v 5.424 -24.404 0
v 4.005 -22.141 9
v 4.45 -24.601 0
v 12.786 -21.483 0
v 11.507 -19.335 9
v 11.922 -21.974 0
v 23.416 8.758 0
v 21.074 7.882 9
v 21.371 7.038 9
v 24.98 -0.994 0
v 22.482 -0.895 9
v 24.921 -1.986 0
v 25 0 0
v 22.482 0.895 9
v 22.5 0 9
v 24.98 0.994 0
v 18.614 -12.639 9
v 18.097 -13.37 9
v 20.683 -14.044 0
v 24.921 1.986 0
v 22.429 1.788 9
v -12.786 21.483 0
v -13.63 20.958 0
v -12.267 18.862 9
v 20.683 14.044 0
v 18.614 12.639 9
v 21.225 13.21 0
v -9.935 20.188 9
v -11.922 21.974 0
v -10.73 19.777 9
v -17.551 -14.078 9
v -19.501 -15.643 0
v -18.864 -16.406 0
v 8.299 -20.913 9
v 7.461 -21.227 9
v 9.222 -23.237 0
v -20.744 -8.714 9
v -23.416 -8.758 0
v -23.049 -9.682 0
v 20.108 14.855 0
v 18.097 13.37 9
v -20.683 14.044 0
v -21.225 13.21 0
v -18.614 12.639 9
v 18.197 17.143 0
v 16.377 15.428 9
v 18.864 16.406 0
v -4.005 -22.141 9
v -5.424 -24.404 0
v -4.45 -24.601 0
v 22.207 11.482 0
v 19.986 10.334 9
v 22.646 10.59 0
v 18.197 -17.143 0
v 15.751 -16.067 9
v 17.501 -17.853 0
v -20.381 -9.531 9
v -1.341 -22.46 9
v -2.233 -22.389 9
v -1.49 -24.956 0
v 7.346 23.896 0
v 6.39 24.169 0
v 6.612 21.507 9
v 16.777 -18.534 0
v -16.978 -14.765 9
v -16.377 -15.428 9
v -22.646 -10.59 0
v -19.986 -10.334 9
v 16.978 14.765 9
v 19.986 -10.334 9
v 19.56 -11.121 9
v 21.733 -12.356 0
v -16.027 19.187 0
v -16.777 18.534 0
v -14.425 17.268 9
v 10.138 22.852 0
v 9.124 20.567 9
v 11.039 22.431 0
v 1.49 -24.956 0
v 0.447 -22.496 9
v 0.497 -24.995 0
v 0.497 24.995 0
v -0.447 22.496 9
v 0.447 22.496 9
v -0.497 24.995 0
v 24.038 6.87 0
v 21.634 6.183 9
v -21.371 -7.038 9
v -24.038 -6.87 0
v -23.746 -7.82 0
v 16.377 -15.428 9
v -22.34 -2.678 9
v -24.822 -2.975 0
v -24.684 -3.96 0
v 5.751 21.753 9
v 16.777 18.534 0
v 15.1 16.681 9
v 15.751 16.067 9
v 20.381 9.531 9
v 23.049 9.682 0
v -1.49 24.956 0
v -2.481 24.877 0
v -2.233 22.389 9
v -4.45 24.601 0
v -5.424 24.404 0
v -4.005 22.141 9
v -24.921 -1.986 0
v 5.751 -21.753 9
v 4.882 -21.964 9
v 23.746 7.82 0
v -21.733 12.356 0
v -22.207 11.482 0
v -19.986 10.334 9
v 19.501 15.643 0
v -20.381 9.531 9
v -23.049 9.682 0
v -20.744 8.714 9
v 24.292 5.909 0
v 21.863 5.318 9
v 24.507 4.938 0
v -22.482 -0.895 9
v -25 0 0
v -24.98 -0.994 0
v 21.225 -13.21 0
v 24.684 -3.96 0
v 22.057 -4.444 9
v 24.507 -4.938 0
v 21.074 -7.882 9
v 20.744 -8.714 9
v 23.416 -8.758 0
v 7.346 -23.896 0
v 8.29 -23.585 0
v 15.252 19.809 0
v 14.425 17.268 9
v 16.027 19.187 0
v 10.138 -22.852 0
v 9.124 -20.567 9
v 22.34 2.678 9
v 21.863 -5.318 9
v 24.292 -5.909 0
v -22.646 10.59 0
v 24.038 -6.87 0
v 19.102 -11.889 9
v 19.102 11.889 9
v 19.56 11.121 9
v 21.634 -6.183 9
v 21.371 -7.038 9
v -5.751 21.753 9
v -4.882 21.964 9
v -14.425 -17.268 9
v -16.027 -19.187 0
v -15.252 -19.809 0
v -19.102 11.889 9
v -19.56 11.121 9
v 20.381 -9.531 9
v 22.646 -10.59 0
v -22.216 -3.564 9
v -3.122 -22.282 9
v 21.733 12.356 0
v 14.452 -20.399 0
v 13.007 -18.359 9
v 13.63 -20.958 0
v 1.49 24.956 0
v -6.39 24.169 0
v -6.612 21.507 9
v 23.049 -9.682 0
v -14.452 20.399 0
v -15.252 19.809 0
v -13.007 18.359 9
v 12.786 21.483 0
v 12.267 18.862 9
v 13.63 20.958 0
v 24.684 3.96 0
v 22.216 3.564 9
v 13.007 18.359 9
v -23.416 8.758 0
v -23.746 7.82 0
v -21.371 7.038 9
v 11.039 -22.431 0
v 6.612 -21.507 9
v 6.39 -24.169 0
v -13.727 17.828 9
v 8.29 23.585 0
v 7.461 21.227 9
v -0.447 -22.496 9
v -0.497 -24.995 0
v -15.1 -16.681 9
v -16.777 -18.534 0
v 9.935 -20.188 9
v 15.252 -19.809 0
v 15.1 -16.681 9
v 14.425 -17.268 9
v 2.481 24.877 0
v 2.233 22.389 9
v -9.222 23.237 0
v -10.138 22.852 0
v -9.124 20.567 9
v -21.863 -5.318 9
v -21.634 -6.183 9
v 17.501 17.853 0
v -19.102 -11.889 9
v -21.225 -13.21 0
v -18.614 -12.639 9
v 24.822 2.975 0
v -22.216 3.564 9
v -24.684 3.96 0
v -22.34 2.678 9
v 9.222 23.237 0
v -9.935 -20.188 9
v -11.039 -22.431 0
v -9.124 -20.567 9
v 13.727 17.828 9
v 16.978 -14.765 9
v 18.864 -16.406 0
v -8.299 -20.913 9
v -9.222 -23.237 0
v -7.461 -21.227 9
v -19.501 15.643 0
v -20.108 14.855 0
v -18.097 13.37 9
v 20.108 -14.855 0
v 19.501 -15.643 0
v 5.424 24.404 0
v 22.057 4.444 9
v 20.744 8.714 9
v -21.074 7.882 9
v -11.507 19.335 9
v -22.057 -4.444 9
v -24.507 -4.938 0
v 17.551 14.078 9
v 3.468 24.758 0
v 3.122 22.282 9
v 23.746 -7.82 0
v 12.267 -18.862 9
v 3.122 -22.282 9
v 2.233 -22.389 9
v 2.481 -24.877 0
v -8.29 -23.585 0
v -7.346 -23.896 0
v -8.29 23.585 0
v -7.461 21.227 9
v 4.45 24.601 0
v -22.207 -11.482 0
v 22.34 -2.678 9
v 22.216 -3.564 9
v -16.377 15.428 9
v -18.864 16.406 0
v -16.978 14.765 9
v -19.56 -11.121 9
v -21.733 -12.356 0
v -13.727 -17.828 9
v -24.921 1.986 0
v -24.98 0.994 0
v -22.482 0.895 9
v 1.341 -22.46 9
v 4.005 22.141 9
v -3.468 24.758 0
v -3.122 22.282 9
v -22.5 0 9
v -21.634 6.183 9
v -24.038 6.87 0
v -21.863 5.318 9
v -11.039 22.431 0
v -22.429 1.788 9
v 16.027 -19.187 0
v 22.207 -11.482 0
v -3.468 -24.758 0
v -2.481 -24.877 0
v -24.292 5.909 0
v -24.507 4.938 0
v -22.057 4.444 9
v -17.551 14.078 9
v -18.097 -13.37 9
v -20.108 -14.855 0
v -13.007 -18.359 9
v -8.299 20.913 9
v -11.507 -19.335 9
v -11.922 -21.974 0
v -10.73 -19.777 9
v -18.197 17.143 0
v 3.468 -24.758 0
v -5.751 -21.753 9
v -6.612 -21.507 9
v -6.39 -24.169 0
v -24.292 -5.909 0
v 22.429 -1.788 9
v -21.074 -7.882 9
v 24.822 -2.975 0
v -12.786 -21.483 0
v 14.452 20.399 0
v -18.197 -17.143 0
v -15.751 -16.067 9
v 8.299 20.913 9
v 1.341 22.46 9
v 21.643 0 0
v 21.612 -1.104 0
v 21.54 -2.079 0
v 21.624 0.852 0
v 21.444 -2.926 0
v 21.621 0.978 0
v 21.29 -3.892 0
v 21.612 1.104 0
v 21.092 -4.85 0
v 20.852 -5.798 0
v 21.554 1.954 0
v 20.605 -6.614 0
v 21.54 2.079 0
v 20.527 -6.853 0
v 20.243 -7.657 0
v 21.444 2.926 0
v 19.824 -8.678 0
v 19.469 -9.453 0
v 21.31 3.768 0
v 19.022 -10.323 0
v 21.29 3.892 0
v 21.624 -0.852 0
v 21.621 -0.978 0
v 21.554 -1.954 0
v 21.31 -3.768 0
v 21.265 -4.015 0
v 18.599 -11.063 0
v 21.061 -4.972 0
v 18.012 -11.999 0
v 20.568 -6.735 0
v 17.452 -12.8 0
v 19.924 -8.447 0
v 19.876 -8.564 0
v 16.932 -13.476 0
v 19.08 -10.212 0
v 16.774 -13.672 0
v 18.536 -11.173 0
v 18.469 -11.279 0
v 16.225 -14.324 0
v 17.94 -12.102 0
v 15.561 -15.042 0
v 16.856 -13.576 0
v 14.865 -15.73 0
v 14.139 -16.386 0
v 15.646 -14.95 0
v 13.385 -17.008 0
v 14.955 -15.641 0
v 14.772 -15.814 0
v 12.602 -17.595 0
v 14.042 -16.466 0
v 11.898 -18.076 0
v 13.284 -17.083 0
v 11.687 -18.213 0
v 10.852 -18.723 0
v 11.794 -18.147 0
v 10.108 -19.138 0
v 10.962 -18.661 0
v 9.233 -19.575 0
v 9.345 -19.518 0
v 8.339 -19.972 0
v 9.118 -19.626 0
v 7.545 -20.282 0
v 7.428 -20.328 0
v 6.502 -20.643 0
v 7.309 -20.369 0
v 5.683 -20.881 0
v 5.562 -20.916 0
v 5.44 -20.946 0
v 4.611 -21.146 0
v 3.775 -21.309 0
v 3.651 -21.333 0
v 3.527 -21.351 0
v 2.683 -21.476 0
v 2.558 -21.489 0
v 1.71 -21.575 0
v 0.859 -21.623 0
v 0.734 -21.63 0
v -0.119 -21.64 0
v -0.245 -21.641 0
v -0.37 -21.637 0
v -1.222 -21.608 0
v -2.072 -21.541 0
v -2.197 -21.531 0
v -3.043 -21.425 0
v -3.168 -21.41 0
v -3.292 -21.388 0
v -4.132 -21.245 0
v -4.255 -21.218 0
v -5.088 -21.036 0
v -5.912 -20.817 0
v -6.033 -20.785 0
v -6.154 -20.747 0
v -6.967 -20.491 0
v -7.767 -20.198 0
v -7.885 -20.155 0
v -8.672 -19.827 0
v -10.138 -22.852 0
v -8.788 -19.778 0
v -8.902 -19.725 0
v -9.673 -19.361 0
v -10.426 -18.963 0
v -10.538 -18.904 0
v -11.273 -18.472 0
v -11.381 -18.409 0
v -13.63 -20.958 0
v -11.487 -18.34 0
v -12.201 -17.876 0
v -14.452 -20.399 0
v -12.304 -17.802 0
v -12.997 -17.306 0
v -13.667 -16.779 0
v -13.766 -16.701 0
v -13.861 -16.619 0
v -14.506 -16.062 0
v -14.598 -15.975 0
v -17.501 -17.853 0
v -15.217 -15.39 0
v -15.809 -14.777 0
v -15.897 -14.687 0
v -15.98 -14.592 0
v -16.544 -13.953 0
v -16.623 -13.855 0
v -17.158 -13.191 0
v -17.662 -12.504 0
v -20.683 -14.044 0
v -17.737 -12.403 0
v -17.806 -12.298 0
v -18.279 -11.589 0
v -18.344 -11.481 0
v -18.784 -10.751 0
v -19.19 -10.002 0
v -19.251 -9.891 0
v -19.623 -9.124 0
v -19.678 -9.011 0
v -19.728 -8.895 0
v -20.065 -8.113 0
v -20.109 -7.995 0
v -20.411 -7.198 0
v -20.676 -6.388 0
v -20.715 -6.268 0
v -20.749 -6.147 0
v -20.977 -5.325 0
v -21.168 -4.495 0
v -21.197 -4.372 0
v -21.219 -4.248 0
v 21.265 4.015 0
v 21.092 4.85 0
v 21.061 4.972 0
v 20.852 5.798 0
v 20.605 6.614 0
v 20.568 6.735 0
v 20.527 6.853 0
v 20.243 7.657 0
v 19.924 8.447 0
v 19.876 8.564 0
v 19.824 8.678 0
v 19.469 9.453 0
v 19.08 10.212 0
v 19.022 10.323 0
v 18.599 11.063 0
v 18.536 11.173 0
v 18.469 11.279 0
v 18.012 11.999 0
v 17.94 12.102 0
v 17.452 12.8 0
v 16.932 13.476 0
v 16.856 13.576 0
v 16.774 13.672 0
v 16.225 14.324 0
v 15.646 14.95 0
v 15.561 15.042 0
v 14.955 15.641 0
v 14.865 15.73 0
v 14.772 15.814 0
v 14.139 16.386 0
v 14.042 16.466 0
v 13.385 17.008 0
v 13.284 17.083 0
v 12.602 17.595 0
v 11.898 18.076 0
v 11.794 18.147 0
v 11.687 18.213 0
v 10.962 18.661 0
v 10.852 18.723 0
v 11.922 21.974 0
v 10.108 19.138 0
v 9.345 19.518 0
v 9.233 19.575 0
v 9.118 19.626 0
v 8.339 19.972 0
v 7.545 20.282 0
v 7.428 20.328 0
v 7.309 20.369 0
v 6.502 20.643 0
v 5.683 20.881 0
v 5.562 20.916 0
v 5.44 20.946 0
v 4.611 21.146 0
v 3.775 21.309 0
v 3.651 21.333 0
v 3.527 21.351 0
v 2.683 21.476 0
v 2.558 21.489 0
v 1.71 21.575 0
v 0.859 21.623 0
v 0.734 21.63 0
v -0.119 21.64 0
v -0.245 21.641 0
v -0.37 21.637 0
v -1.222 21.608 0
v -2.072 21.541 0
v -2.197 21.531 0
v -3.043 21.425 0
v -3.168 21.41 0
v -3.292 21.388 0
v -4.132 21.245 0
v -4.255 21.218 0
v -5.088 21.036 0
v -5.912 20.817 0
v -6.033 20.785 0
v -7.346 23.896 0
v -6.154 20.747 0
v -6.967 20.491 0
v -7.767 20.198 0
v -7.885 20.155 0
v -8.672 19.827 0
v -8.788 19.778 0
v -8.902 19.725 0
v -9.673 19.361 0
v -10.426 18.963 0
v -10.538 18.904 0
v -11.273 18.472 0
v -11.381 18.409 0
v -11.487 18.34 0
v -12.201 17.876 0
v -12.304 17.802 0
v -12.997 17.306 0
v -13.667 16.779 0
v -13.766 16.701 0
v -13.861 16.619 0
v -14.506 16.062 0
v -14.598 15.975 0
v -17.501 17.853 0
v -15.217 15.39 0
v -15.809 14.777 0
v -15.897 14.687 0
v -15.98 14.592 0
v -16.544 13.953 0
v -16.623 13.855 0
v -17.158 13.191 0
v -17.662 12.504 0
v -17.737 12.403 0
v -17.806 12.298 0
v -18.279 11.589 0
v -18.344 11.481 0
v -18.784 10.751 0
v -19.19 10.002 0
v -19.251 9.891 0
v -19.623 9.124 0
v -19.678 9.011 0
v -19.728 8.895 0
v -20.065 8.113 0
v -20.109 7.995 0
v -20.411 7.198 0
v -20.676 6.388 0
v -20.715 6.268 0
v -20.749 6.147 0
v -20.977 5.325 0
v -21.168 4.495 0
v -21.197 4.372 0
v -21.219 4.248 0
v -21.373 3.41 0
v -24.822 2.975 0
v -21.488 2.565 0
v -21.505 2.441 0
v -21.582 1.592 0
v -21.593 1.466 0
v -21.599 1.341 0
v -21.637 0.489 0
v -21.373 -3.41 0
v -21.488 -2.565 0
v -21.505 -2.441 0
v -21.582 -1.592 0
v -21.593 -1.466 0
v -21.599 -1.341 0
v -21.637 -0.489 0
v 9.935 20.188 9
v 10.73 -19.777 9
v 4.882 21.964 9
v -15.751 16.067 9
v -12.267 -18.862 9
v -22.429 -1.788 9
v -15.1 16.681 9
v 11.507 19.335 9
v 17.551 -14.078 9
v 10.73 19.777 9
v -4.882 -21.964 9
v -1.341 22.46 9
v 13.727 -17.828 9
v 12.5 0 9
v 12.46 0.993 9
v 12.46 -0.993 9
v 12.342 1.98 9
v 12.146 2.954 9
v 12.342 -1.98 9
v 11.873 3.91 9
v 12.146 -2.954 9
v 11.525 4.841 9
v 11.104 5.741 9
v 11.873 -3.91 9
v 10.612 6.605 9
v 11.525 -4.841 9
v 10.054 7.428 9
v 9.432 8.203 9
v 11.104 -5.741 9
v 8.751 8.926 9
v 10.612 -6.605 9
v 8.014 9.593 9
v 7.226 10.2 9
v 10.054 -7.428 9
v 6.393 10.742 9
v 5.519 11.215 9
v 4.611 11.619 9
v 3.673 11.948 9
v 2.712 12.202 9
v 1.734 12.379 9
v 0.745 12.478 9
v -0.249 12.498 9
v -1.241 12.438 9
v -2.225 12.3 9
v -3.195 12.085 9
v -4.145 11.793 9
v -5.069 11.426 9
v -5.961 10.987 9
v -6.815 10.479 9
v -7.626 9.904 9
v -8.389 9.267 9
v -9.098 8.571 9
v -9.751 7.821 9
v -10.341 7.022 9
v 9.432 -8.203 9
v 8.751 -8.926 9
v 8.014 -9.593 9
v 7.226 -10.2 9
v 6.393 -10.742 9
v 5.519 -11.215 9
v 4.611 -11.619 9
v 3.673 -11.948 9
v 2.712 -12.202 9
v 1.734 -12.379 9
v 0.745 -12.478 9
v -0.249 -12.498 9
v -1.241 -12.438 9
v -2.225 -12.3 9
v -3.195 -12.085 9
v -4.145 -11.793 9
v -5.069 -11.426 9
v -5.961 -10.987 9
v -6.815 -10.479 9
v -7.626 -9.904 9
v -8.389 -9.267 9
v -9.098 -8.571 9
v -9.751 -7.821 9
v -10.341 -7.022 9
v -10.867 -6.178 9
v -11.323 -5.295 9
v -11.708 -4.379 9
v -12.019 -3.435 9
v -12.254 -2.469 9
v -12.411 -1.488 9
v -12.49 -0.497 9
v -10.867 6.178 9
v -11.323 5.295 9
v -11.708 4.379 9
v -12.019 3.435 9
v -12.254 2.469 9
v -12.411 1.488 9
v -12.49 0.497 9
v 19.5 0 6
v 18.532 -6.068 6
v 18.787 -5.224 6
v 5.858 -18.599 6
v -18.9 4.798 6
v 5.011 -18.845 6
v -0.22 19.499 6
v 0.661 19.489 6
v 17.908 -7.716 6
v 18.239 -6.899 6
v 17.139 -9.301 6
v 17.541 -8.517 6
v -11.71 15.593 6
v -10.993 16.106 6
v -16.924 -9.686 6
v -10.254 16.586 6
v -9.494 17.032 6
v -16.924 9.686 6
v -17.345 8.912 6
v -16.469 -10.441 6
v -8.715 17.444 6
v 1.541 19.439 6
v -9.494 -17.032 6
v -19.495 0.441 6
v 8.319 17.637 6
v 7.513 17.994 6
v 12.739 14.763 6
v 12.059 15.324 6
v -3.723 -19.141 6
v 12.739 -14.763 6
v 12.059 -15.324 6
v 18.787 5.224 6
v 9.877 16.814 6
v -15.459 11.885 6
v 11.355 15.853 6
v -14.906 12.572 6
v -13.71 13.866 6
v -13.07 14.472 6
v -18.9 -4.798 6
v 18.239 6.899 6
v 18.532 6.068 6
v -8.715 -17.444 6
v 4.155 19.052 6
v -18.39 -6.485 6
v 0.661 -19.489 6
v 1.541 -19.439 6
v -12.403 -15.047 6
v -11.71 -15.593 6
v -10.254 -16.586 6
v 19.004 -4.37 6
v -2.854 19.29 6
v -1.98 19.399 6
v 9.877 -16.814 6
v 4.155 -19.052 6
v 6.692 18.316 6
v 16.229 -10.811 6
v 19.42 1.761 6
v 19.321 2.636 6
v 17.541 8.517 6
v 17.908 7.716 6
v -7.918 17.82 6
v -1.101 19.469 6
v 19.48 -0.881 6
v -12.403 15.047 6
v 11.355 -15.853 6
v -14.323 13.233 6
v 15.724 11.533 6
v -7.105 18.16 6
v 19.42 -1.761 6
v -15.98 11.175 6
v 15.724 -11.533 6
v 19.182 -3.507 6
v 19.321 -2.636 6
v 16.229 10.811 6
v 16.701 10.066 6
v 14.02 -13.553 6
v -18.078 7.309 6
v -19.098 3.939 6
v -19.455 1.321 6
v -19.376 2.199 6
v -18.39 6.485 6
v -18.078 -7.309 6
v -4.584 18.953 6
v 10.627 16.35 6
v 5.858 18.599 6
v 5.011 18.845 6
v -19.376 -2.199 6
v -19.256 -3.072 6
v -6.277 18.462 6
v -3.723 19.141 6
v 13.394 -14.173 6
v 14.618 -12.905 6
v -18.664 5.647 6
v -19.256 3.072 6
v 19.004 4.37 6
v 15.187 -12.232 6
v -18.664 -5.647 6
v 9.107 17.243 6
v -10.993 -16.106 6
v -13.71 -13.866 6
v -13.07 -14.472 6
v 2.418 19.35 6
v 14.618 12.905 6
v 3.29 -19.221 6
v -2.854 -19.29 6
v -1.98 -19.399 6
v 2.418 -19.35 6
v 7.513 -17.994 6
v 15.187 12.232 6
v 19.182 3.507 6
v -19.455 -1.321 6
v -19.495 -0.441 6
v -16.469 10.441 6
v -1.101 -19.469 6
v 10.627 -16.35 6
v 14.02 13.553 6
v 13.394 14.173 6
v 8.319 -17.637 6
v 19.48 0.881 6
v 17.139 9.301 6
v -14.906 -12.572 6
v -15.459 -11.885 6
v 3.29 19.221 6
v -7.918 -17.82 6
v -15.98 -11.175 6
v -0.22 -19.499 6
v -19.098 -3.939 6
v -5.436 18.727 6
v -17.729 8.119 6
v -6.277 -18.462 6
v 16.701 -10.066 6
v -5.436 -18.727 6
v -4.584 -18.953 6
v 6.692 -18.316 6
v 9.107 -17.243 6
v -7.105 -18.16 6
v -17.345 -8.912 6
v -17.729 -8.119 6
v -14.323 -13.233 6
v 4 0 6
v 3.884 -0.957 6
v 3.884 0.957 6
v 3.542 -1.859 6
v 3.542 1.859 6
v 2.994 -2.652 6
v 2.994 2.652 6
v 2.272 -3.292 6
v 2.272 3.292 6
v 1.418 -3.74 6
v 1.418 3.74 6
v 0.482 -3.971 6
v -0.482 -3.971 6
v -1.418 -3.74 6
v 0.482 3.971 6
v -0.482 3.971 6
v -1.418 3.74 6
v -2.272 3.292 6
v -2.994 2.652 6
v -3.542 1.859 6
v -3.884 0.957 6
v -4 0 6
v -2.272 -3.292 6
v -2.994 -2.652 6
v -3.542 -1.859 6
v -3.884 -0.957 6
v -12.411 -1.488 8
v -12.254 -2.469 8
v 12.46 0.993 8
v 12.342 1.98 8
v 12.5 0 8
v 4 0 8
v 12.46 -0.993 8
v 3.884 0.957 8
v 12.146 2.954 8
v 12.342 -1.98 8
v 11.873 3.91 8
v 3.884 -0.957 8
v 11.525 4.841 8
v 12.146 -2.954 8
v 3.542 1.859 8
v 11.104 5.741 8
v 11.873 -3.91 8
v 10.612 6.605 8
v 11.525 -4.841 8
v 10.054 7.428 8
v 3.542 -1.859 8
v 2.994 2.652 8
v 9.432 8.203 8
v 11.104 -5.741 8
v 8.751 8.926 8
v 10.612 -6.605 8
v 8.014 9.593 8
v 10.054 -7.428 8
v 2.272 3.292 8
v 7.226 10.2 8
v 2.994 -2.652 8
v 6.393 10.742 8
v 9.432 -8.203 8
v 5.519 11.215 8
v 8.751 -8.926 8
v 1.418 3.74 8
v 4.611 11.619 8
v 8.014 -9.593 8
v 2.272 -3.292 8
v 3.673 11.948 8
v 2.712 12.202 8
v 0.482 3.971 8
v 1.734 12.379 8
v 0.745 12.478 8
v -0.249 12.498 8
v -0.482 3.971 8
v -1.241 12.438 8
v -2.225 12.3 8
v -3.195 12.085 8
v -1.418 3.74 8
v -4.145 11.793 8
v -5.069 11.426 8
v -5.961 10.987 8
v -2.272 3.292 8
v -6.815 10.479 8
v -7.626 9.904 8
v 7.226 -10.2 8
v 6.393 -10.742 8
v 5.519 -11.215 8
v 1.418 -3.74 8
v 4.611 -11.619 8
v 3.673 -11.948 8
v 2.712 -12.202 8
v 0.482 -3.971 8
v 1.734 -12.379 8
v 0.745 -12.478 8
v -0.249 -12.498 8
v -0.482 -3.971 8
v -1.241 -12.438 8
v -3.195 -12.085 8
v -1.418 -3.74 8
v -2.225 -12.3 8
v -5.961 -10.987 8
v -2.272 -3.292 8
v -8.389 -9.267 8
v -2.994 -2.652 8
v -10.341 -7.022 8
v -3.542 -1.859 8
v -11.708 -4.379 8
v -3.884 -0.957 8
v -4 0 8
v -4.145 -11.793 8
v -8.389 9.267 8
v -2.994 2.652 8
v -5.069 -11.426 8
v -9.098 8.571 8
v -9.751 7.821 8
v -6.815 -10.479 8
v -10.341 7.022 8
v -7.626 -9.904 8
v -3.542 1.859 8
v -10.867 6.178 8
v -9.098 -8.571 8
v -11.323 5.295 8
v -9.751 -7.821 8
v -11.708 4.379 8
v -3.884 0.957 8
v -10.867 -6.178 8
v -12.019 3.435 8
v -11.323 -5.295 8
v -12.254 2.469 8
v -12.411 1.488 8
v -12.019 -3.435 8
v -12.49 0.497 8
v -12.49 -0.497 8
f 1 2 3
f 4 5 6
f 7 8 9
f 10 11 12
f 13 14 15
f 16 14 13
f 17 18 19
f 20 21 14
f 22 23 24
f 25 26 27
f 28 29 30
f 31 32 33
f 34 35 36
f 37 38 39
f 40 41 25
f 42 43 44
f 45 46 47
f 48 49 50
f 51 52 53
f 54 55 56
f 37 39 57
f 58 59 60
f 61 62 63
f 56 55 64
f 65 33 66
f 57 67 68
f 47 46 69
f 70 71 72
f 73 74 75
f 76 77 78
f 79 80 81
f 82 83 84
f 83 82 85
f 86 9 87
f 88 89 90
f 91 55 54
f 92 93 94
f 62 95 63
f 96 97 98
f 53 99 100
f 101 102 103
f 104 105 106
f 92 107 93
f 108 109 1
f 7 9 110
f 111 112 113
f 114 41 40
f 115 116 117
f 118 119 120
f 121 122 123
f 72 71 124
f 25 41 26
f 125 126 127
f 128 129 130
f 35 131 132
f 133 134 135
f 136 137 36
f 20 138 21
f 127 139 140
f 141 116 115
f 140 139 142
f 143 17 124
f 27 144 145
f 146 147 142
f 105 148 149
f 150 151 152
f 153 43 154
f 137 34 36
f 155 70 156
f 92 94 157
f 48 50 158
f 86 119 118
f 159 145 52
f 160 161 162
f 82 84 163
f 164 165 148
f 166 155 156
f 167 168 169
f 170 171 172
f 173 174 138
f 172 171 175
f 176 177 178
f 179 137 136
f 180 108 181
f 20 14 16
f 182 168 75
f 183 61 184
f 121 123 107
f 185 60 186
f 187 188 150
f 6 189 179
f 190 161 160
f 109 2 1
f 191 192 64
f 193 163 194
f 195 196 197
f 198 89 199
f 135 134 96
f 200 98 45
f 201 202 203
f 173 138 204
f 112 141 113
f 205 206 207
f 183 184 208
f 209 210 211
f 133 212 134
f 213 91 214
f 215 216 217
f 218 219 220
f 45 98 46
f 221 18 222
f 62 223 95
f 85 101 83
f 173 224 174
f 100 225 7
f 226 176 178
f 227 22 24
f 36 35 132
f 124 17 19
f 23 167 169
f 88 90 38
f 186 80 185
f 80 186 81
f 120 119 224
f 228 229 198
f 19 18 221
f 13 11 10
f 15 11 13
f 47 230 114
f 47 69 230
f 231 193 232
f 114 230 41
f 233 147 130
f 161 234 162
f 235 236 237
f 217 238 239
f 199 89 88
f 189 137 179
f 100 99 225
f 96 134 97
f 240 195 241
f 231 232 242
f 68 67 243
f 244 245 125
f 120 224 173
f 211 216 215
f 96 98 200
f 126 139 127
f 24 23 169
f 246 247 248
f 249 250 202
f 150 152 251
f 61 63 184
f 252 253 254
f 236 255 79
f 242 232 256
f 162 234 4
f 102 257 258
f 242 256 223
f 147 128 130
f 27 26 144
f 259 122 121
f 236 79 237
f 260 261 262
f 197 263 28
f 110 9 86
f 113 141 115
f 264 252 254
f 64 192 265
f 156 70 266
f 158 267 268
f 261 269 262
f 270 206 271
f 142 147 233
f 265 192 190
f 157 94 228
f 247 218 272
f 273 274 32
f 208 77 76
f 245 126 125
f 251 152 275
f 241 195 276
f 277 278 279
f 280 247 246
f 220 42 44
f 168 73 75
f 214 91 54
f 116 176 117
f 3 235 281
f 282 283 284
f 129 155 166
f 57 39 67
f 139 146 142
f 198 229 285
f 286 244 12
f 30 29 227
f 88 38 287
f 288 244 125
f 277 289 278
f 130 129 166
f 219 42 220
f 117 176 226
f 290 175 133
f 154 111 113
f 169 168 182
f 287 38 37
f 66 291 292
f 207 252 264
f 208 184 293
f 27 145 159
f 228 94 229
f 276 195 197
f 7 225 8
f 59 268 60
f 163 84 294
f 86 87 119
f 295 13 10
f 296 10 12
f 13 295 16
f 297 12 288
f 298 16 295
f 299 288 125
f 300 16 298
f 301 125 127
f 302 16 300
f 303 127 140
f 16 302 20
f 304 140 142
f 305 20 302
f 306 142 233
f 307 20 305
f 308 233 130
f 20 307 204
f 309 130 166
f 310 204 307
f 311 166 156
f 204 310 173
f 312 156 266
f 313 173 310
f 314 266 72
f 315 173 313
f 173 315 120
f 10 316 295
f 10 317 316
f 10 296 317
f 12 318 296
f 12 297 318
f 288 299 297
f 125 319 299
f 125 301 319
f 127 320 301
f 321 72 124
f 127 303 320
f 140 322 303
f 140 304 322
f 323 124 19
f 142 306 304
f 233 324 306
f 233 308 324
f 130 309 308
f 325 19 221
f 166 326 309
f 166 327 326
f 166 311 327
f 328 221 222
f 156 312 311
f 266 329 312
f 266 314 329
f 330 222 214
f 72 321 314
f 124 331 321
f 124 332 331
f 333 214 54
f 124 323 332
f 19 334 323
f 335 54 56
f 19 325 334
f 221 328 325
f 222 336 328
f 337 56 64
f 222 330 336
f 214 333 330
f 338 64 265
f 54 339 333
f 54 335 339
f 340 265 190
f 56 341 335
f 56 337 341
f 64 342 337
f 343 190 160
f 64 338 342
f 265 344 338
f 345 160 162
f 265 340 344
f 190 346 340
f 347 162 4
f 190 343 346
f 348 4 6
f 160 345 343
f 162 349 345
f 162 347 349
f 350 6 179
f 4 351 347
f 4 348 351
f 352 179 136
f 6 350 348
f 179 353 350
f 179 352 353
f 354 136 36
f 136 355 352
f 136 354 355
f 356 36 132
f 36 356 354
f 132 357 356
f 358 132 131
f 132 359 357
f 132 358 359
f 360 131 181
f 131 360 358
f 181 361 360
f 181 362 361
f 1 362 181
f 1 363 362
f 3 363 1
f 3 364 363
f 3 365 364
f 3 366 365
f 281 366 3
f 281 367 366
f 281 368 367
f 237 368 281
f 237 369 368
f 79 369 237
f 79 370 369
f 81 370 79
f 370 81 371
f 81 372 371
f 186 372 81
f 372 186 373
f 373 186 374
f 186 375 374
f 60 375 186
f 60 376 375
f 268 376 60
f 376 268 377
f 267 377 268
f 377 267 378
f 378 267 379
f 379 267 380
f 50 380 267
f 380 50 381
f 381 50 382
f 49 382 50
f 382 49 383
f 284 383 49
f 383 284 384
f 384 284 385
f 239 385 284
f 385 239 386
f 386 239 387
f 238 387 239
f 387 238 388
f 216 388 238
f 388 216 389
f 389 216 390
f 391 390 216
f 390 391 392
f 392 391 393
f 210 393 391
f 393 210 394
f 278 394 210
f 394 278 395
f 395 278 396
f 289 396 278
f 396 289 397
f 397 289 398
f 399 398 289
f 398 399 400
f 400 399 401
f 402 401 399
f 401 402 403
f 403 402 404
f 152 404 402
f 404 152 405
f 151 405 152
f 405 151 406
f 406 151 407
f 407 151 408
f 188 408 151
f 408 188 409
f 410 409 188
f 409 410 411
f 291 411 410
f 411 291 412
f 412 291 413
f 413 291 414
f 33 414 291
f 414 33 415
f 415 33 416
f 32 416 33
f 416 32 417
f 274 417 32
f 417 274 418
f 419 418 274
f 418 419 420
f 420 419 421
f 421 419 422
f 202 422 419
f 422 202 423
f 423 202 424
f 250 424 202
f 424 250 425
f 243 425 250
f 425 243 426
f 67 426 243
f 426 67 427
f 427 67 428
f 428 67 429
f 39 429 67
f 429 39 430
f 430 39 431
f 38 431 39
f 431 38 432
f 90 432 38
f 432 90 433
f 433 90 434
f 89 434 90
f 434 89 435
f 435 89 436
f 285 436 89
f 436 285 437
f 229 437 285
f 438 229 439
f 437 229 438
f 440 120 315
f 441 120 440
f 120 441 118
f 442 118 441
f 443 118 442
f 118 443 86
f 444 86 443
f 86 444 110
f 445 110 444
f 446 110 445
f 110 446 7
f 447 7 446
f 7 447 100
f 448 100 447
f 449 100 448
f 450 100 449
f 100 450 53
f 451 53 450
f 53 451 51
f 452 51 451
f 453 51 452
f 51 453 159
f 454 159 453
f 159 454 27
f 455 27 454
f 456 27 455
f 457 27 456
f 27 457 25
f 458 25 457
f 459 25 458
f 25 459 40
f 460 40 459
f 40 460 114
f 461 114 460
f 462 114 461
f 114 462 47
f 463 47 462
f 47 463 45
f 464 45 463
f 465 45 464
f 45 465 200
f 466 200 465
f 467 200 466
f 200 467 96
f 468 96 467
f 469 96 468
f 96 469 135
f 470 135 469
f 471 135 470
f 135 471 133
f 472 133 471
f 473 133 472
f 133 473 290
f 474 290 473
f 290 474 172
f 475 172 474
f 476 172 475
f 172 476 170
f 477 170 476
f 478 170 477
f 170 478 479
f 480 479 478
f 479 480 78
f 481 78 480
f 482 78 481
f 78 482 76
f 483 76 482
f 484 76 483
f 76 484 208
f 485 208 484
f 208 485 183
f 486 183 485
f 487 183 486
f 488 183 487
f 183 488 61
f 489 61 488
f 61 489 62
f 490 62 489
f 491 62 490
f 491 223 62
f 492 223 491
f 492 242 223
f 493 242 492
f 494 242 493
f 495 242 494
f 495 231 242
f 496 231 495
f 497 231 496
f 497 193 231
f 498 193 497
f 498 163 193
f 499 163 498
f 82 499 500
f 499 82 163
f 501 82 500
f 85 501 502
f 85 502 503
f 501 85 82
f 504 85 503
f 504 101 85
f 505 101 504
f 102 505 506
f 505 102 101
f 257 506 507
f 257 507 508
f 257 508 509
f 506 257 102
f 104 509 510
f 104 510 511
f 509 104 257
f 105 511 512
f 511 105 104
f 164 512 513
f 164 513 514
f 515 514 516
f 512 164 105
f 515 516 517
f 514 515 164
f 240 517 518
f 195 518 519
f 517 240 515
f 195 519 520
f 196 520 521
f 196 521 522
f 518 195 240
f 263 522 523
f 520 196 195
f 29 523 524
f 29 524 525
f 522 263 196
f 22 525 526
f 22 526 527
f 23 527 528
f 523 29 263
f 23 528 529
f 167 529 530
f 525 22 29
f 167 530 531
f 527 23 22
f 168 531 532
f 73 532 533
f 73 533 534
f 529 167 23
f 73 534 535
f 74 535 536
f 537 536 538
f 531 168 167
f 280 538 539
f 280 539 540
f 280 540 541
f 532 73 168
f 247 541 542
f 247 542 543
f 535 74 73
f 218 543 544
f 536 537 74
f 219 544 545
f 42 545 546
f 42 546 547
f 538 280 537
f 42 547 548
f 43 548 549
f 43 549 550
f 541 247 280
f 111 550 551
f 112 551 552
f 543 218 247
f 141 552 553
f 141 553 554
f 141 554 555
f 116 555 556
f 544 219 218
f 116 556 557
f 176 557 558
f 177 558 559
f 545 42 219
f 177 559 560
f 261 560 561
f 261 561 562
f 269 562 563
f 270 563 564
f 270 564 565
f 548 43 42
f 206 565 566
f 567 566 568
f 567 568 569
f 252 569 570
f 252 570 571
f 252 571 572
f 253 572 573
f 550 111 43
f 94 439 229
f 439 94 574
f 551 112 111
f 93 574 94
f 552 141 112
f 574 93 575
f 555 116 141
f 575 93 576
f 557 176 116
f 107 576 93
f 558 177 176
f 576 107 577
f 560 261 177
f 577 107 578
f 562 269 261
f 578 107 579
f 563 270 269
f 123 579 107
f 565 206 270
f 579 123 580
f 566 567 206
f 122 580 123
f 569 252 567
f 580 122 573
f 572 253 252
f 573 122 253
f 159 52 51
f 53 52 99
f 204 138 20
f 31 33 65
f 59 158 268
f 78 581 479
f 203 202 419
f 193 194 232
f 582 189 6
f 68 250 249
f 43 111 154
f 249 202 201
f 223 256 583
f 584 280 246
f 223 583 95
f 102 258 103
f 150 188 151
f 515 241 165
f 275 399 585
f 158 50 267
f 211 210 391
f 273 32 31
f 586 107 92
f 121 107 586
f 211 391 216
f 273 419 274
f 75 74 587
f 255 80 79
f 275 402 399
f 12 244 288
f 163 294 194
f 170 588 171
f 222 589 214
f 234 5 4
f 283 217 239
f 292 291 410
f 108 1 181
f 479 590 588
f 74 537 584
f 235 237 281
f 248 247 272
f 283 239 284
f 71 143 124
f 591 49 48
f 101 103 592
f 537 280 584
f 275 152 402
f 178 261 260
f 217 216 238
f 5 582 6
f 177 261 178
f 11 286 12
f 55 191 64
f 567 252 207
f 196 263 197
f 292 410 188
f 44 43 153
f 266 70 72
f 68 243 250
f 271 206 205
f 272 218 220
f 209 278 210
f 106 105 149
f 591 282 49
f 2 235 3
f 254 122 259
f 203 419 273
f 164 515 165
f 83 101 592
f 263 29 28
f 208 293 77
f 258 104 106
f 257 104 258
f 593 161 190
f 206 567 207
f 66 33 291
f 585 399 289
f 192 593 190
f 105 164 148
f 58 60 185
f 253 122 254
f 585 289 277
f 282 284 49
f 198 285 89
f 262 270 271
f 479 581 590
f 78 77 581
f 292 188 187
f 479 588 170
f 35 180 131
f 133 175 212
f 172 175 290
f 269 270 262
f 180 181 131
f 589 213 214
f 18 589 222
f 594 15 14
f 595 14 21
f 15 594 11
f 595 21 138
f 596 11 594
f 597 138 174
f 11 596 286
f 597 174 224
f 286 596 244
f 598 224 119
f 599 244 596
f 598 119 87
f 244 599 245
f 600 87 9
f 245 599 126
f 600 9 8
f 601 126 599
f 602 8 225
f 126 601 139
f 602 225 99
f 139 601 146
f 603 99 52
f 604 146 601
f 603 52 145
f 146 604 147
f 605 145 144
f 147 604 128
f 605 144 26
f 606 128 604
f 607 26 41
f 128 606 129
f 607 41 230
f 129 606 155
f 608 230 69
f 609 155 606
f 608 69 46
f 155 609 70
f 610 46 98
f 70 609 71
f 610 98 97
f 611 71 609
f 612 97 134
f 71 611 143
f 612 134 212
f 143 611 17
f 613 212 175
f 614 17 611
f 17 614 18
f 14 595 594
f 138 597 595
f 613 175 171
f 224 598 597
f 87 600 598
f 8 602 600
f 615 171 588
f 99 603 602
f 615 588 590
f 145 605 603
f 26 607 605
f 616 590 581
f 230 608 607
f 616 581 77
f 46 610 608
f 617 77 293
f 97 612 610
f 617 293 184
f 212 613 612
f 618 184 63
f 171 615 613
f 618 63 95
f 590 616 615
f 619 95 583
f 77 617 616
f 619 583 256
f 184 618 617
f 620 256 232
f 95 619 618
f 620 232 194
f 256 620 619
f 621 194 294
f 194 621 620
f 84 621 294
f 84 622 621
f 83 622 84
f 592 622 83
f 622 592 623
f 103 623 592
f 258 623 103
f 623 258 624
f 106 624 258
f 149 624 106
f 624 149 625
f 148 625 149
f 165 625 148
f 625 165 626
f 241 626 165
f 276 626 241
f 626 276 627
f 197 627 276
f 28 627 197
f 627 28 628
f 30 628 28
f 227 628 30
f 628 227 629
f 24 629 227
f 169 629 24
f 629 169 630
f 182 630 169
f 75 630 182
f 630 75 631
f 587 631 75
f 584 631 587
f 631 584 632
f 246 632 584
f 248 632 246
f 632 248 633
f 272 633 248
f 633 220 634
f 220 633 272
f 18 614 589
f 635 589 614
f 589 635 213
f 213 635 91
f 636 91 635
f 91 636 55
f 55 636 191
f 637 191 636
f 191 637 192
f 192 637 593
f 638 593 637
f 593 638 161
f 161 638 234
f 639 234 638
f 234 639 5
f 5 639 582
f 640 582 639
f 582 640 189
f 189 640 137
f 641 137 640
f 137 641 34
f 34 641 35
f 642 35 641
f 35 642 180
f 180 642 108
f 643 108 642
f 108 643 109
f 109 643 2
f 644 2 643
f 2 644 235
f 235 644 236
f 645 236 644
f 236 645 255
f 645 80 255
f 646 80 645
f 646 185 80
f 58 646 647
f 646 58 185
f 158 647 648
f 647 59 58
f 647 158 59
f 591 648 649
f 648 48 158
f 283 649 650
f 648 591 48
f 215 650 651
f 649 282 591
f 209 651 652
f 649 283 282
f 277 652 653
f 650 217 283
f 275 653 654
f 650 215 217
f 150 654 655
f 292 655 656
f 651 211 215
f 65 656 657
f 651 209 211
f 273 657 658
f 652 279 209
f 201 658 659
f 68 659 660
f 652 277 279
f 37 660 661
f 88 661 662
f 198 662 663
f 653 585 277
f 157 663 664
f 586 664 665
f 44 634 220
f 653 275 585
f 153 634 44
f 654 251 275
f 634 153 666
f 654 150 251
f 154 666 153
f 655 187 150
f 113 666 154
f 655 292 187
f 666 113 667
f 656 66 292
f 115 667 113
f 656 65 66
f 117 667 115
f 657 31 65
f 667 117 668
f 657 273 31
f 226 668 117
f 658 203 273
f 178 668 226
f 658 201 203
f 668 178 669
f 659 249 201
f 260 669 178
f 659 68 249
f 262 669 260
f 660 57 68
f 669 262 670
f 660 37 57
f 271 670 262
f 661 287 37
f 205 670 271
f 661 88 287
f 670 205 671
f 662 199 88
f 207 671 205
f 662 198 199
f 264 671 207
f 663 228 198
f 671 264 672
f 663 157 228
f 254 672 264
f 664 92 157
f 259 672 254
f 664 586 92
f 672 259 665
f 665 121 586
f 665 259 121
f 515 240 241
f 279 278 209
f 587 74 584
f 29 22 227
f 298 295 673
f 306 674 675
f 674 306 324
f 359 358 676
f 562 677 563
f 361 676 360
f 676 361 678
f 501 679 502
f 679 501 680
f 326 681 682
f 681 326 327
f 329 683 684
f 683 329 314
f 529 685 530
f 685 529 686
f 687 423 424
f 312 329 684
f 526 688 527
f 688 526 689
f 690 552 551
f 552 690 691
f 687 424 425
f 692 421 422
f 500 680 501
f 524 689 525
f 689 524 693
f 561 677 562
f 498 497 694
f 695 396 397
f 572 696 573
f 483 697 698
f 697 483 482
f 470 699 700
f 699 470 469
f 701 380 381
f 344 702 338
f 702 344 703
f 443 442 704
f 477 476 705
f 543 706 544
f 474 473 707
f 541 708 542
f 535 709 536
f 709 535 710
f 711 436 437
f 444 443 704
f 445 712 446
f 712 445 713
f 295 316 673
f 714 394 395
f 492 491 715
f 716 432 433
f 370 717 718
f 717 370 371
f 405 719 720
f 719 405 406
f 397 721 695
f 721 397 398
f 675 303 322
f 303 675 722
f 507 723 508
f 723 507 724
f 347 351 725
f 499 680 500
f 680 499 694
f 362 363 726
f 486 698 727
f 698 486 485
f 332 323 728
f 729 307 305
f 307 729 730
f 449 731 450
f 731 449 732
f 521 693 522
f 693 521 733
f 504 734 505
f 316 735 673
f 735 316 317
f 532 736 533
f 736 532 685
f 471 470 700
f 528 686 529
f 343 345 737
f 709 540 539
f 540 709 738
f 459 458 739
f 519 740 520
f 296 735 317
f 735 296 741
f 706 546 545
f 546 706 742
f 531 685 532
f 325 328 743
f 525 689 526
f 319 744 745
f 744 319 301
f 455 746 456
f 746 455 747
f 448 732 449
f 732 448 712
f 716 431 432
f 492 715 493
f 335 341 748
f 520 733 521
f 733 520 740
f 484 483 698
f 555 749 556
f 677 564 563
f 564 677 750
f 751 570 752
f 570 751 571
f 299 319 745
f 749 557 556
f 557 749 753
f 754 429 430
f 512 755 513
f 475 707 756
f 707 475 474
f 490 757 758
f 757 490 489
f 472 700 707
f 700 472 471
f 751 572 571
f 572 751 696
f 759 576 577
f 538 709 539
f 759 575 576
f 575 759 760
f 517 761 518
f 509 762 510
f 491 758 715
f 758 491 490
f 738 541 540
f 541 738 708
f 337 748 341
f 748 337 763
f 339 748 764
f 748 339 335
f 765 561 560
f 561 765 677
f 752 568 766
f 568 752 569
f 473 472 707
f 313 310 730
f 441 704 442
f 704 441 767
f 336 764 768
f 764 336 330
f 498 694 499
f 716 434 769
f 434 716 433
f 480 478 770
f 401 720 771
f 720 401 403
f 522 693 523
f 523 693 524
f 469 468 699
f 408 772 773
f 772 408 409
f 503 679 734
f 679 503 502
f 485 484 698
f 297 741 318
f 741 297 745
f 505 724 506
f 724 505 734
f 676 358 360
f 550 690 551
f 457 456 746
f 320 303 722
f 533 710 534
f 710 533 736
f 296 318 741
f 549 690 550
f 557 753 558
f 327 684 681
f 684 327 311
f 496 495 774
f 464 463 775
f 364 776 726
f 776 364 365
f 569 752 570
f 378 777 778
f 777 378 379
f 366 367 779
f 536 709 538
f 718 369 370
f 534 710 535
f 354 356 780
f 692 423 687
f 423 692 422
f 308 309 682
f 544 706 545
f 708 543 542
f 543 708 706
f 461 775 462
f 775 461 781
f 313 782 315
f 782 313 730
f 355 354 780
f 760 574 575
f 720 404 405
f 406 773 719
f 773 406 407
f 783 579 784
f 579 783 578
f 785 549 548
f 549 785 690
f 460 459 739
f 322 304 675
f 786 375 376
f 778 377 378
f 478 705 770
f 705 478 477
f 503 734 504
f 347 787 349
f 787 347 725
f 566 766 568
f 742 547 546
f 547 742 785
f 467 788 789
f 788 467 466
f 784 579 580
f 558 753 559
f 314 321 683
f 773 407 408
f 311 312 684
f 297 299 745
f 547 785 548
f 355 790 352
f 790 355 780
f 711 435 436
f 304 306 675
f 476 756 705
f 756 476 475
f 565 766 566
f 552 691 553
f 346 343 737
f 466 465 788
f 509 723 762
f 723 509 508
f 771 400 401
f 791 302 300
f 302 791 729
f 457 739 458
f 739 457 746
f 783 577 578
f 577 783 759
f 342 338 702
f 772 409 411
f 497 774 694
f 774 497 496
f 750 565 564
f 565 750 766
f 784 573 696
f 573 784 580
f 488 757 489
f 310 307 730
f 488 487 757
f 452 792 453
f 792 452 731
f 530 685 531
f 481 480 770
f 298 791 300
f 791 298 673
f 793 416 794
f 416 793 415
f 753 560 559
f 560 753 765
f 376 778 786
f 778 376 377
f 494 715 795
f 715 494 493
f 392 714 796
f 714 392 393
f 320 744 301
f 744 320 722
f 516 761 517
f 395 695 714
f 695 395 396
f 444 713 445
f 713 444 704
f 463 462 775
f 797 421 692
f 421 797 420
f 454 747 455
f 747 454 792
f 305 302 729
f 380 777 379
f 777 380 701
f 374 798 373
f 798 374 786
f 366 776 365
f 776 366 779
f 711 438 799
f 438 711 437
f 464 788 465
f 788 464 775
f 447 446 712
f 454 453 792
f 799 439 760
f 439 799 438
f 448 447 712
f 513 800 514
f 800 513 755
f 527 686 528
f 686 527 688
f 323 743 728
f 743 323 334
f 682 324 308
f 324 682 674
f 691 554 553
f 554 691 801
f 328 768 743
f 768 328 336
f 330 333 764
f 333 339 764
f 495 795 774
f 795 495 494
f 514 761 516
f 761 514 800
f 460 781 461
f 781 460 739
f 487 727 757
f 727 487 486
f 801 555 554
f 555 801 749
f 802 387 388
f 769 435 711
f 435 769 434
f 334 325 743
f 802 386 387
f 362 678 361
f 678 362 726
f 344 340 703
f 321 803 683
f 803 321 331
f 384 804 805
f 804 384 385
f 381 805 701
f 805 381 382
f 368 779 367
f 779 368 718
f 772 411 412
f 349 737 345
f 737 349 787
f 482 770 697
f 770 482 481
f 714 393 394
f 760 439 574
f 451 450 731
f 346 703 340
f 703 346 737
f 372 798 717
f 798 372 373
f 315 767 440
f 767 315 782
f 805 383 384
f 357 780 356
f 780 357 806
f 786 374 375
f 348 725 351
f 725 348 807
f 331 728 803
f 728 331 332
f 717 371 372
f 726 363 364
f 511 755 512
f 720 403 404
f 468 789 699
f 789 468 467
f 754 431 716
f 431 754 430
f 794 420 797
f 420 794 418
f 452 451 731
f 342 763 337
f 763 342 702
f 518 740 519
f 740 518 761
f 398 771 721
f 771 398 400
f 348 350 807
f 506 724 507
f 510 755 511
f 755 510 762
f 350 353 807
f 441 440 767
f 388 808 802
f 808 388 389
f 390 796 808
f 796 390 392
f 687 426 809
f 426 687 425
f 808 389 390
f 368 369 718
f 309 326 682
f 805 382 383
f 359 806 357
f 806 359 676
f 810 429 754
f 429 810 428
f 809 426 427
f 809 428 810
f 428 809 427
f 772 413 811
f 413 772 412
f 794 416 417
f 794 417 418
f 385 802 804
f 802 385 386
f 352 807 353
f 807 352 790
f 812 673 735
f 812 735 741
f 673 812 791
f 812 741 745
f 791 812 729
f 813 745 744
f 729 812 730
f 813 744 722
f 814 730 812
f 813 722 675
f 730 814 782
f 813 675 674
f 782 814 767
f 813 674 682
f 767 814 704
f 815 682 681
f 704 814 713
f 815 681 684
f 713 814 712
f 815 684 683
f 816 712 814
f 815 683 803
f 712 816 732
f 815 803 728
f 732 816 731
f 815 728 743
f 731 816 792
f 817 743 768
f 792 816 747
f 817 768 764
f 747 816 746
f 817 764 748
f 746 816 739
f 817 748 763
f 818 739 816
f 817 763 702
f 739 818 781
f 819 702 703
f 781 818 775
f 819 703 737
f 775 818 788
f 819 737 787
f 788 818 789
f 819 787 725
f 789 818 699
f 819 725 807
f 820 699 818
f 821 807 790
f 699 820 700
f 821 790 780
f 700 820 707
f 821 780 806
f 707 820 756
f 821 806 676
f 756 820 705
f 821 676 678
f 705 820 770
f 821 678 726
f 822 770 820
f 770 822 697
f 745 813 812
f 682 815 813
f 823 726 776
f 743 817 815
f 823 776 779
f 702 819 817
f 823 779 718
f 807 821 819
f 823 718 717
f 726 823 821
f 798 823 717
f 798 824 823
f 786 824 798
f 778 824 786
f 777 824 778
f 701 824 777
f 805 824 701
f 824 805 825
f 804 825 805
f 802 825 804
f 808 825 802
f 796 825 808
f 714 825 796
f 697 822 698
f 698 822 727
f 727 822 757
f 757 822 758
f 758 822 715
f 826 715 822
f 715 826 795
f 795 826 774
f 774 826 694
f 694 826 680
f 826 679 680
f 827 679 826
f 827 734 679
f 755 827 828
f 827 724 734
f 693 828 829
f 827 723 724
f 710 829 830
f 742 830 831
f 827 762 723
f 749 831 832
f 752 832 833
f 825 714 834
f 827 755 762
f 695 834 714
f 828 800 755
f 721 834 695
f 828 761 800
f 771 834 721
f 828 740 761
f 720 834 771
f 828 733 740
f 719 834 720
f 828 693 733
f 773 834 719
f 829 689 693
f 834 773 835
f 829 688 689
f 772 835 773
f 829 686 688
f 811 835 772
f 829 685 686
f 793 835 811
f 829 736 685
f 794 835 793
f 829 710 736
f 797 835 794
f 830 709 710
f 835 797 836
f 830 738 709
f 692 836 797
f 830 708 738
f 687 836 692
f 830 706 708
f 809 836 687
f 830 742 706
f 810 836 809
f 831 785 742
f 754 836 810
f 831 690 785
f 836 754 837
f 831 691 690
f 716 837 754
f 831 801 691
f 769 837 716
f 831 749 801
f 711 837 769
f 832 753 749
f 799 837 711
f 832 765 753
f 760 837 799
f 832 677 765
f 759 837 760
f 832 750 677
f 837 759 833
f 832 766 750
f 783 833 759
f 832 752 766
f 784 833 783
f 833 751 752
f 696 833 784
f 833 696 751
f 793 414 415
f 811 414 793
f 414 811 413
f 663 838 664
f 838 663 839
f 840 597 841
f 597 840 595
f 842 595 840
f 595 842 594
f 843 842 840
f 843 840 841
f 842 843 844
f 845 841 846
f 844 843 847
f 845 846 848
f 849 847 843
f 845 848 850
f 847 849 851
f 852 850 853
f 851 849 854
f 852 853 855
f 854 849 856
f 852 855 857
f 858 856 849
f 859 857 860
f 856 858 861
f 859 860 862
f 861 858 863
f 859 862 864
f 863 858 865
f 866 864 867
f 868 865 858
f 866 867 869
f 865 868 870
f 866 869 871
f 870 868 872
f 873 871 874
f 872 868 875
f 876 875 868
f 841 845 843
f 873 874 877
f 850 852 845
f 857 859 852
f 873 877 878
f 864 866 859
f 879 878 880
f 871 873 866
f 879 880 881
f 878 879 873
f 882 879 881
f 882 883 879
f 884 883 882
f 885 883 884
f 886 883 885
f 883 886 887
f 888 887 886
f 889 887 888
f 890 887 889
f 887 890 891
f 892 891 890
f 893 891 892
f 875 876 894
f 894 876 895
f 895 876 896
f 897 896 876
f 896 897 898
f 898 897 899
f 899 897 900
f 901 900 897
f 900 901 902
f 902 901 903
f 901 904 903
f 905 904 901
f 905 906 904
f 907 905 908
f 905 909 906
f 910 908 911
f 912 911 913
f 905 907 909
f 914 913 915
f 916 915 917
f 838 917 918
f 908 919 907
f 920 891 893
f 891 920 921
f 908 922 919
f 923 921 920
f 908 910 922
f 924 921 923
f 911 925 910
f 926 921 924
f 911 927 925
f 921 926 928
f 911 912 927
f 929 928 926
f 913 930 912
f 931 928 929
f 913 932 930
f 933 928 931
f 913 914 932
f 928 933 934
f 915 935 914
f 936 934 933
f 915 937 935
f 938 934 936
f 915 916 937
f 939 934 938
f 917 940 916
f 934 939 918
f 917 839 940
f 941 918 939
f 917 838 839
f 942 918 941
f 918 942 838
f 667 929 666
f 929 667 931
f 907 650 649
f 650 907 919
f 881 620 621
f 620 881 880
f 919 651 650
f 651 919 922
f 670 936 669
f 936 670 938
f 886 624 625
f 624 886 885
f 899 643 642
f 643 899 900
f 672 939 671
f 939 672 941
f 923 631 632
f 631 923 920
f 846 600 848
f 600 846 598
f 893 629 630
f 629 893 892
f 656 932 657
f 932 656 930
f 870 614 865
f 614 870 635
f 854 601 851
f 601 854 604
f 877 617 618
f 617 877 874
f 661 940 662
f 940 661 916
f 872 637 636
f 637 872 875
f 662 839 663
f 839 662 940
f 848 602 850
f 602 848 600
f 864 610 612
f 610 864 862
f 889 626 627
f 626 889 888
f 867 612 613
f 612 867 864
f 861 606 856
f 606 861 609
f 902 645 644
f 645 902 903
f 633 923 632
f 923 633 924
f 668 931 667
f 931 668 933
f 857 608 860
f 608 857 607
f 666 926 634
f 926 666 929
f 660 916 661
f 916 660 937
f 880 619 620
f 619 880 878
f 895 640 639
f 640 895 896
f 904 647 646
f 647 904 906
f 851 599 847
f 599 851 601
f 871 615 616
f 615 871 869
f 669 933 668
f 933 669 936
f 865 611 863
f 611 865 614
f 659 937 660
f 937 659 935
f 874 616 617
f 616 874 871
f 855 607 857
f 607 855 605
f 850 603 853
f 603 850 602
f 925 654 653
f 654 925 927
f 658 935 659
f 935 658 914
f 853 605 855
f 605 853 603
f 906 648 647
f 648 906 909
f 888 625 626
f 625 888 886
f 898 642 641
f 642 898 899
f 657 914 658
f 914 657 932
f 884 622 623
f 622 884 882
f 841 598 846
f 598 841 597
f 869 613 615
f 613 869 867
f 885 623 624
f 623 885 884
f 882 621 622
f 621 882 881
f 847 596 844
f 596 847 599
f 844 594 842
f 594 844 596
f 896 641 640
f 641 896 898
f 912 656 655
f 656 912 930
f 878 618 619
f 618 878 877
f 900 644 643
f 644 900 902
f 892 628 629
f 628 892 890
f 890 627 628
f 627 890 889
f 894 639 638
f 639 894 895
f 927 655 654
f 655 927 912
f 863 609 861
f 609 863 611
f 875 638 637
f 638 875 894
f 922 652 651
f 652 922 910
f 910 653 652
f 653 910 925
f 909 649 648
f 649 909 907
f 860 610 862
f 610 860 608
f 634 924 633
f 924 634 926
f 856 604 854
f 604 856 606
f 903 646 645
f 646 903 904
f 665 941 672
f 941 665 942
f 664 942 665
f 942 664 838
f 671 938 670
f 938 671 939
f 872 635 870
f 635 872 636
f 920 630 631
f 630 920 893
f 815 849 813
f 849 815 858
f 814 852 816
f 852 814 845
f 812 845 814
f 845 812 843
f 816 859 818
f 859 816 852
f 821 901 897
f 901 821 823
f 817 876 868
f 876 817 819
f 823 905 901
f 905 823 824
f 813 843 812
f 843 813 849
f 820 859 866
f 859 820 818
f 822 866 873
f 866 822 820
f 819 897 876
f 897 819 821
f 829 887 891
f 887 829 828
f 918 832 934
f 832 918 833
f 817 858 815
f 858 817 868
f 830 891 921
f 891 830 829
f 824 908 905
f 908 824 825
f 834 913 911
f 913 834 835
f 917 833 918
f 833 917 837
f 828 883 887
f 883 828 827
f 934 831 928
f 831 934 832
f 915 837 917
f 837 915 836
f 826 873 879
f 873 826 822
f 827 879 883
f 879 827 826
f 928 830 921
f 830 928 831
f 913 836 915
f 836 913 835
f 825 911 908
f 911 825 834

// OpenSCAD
// Button soccer player (gombfoci) - 1.0
// by György Balássy 2016 (http://gyorgybalassy.wordpress.com)
// http://www.thingiverse.com/thing:1359651

// The diameter of the bottom ring in millimeters.
bottomDiameter = 50;

// The diameter of the top ring in millimeters.
topDiameter = 45;

// The total height of the player in millimeters.
height = 9; 

// The wall thickness in millimeters.
thickness=3;

/* [Hidden] */

$fa=1;   // Default minimum facet angle.
$fs=1;   // Default minimum facet size.
delta=1; // Ensures that no faces remains after boolean operations.

labelDiameter = 25;
labelDepth = 1;
holeDiameter = 8;

mainColor = [0.117, 0.565, 1];  // DodgerBlue: RGB(30, 144, 255)
highlightColor = [0.384, 0.726, 1]; // Lighter DodgerBlue: RGB(98, 185, 255)

echo(str("Drawing a ", bottomDiameter, "×", topDiameter, "×", height, " player..."));

difference()
{
  // Draw the outer shell.
  color(mainColor)
    cylinder(d1 = bottomDiameter, 
             d2 = topDiameter, 
              h = height);
  
  // Subtract the main body from the bottom.
  color(highlightColor)
    translate([0, 0, -delta])
      cylinder(d1 = bottomDiameter - 2 * thickness, 
               d2 = topDiameter - 2 * thickness, 
                h = height - thickness + delta);
  
  // Subtract the round shape for the label from the top.
  color(highlightColor)
    translate([0, 0, height - labelDepth])
      cylinder(d = labelDiameter,
               h = labelDepth + delta);
  
  // Drill the hole.
  color(highlightColor)
    cylinder(d = holeDiameter,
             h = height);
}
